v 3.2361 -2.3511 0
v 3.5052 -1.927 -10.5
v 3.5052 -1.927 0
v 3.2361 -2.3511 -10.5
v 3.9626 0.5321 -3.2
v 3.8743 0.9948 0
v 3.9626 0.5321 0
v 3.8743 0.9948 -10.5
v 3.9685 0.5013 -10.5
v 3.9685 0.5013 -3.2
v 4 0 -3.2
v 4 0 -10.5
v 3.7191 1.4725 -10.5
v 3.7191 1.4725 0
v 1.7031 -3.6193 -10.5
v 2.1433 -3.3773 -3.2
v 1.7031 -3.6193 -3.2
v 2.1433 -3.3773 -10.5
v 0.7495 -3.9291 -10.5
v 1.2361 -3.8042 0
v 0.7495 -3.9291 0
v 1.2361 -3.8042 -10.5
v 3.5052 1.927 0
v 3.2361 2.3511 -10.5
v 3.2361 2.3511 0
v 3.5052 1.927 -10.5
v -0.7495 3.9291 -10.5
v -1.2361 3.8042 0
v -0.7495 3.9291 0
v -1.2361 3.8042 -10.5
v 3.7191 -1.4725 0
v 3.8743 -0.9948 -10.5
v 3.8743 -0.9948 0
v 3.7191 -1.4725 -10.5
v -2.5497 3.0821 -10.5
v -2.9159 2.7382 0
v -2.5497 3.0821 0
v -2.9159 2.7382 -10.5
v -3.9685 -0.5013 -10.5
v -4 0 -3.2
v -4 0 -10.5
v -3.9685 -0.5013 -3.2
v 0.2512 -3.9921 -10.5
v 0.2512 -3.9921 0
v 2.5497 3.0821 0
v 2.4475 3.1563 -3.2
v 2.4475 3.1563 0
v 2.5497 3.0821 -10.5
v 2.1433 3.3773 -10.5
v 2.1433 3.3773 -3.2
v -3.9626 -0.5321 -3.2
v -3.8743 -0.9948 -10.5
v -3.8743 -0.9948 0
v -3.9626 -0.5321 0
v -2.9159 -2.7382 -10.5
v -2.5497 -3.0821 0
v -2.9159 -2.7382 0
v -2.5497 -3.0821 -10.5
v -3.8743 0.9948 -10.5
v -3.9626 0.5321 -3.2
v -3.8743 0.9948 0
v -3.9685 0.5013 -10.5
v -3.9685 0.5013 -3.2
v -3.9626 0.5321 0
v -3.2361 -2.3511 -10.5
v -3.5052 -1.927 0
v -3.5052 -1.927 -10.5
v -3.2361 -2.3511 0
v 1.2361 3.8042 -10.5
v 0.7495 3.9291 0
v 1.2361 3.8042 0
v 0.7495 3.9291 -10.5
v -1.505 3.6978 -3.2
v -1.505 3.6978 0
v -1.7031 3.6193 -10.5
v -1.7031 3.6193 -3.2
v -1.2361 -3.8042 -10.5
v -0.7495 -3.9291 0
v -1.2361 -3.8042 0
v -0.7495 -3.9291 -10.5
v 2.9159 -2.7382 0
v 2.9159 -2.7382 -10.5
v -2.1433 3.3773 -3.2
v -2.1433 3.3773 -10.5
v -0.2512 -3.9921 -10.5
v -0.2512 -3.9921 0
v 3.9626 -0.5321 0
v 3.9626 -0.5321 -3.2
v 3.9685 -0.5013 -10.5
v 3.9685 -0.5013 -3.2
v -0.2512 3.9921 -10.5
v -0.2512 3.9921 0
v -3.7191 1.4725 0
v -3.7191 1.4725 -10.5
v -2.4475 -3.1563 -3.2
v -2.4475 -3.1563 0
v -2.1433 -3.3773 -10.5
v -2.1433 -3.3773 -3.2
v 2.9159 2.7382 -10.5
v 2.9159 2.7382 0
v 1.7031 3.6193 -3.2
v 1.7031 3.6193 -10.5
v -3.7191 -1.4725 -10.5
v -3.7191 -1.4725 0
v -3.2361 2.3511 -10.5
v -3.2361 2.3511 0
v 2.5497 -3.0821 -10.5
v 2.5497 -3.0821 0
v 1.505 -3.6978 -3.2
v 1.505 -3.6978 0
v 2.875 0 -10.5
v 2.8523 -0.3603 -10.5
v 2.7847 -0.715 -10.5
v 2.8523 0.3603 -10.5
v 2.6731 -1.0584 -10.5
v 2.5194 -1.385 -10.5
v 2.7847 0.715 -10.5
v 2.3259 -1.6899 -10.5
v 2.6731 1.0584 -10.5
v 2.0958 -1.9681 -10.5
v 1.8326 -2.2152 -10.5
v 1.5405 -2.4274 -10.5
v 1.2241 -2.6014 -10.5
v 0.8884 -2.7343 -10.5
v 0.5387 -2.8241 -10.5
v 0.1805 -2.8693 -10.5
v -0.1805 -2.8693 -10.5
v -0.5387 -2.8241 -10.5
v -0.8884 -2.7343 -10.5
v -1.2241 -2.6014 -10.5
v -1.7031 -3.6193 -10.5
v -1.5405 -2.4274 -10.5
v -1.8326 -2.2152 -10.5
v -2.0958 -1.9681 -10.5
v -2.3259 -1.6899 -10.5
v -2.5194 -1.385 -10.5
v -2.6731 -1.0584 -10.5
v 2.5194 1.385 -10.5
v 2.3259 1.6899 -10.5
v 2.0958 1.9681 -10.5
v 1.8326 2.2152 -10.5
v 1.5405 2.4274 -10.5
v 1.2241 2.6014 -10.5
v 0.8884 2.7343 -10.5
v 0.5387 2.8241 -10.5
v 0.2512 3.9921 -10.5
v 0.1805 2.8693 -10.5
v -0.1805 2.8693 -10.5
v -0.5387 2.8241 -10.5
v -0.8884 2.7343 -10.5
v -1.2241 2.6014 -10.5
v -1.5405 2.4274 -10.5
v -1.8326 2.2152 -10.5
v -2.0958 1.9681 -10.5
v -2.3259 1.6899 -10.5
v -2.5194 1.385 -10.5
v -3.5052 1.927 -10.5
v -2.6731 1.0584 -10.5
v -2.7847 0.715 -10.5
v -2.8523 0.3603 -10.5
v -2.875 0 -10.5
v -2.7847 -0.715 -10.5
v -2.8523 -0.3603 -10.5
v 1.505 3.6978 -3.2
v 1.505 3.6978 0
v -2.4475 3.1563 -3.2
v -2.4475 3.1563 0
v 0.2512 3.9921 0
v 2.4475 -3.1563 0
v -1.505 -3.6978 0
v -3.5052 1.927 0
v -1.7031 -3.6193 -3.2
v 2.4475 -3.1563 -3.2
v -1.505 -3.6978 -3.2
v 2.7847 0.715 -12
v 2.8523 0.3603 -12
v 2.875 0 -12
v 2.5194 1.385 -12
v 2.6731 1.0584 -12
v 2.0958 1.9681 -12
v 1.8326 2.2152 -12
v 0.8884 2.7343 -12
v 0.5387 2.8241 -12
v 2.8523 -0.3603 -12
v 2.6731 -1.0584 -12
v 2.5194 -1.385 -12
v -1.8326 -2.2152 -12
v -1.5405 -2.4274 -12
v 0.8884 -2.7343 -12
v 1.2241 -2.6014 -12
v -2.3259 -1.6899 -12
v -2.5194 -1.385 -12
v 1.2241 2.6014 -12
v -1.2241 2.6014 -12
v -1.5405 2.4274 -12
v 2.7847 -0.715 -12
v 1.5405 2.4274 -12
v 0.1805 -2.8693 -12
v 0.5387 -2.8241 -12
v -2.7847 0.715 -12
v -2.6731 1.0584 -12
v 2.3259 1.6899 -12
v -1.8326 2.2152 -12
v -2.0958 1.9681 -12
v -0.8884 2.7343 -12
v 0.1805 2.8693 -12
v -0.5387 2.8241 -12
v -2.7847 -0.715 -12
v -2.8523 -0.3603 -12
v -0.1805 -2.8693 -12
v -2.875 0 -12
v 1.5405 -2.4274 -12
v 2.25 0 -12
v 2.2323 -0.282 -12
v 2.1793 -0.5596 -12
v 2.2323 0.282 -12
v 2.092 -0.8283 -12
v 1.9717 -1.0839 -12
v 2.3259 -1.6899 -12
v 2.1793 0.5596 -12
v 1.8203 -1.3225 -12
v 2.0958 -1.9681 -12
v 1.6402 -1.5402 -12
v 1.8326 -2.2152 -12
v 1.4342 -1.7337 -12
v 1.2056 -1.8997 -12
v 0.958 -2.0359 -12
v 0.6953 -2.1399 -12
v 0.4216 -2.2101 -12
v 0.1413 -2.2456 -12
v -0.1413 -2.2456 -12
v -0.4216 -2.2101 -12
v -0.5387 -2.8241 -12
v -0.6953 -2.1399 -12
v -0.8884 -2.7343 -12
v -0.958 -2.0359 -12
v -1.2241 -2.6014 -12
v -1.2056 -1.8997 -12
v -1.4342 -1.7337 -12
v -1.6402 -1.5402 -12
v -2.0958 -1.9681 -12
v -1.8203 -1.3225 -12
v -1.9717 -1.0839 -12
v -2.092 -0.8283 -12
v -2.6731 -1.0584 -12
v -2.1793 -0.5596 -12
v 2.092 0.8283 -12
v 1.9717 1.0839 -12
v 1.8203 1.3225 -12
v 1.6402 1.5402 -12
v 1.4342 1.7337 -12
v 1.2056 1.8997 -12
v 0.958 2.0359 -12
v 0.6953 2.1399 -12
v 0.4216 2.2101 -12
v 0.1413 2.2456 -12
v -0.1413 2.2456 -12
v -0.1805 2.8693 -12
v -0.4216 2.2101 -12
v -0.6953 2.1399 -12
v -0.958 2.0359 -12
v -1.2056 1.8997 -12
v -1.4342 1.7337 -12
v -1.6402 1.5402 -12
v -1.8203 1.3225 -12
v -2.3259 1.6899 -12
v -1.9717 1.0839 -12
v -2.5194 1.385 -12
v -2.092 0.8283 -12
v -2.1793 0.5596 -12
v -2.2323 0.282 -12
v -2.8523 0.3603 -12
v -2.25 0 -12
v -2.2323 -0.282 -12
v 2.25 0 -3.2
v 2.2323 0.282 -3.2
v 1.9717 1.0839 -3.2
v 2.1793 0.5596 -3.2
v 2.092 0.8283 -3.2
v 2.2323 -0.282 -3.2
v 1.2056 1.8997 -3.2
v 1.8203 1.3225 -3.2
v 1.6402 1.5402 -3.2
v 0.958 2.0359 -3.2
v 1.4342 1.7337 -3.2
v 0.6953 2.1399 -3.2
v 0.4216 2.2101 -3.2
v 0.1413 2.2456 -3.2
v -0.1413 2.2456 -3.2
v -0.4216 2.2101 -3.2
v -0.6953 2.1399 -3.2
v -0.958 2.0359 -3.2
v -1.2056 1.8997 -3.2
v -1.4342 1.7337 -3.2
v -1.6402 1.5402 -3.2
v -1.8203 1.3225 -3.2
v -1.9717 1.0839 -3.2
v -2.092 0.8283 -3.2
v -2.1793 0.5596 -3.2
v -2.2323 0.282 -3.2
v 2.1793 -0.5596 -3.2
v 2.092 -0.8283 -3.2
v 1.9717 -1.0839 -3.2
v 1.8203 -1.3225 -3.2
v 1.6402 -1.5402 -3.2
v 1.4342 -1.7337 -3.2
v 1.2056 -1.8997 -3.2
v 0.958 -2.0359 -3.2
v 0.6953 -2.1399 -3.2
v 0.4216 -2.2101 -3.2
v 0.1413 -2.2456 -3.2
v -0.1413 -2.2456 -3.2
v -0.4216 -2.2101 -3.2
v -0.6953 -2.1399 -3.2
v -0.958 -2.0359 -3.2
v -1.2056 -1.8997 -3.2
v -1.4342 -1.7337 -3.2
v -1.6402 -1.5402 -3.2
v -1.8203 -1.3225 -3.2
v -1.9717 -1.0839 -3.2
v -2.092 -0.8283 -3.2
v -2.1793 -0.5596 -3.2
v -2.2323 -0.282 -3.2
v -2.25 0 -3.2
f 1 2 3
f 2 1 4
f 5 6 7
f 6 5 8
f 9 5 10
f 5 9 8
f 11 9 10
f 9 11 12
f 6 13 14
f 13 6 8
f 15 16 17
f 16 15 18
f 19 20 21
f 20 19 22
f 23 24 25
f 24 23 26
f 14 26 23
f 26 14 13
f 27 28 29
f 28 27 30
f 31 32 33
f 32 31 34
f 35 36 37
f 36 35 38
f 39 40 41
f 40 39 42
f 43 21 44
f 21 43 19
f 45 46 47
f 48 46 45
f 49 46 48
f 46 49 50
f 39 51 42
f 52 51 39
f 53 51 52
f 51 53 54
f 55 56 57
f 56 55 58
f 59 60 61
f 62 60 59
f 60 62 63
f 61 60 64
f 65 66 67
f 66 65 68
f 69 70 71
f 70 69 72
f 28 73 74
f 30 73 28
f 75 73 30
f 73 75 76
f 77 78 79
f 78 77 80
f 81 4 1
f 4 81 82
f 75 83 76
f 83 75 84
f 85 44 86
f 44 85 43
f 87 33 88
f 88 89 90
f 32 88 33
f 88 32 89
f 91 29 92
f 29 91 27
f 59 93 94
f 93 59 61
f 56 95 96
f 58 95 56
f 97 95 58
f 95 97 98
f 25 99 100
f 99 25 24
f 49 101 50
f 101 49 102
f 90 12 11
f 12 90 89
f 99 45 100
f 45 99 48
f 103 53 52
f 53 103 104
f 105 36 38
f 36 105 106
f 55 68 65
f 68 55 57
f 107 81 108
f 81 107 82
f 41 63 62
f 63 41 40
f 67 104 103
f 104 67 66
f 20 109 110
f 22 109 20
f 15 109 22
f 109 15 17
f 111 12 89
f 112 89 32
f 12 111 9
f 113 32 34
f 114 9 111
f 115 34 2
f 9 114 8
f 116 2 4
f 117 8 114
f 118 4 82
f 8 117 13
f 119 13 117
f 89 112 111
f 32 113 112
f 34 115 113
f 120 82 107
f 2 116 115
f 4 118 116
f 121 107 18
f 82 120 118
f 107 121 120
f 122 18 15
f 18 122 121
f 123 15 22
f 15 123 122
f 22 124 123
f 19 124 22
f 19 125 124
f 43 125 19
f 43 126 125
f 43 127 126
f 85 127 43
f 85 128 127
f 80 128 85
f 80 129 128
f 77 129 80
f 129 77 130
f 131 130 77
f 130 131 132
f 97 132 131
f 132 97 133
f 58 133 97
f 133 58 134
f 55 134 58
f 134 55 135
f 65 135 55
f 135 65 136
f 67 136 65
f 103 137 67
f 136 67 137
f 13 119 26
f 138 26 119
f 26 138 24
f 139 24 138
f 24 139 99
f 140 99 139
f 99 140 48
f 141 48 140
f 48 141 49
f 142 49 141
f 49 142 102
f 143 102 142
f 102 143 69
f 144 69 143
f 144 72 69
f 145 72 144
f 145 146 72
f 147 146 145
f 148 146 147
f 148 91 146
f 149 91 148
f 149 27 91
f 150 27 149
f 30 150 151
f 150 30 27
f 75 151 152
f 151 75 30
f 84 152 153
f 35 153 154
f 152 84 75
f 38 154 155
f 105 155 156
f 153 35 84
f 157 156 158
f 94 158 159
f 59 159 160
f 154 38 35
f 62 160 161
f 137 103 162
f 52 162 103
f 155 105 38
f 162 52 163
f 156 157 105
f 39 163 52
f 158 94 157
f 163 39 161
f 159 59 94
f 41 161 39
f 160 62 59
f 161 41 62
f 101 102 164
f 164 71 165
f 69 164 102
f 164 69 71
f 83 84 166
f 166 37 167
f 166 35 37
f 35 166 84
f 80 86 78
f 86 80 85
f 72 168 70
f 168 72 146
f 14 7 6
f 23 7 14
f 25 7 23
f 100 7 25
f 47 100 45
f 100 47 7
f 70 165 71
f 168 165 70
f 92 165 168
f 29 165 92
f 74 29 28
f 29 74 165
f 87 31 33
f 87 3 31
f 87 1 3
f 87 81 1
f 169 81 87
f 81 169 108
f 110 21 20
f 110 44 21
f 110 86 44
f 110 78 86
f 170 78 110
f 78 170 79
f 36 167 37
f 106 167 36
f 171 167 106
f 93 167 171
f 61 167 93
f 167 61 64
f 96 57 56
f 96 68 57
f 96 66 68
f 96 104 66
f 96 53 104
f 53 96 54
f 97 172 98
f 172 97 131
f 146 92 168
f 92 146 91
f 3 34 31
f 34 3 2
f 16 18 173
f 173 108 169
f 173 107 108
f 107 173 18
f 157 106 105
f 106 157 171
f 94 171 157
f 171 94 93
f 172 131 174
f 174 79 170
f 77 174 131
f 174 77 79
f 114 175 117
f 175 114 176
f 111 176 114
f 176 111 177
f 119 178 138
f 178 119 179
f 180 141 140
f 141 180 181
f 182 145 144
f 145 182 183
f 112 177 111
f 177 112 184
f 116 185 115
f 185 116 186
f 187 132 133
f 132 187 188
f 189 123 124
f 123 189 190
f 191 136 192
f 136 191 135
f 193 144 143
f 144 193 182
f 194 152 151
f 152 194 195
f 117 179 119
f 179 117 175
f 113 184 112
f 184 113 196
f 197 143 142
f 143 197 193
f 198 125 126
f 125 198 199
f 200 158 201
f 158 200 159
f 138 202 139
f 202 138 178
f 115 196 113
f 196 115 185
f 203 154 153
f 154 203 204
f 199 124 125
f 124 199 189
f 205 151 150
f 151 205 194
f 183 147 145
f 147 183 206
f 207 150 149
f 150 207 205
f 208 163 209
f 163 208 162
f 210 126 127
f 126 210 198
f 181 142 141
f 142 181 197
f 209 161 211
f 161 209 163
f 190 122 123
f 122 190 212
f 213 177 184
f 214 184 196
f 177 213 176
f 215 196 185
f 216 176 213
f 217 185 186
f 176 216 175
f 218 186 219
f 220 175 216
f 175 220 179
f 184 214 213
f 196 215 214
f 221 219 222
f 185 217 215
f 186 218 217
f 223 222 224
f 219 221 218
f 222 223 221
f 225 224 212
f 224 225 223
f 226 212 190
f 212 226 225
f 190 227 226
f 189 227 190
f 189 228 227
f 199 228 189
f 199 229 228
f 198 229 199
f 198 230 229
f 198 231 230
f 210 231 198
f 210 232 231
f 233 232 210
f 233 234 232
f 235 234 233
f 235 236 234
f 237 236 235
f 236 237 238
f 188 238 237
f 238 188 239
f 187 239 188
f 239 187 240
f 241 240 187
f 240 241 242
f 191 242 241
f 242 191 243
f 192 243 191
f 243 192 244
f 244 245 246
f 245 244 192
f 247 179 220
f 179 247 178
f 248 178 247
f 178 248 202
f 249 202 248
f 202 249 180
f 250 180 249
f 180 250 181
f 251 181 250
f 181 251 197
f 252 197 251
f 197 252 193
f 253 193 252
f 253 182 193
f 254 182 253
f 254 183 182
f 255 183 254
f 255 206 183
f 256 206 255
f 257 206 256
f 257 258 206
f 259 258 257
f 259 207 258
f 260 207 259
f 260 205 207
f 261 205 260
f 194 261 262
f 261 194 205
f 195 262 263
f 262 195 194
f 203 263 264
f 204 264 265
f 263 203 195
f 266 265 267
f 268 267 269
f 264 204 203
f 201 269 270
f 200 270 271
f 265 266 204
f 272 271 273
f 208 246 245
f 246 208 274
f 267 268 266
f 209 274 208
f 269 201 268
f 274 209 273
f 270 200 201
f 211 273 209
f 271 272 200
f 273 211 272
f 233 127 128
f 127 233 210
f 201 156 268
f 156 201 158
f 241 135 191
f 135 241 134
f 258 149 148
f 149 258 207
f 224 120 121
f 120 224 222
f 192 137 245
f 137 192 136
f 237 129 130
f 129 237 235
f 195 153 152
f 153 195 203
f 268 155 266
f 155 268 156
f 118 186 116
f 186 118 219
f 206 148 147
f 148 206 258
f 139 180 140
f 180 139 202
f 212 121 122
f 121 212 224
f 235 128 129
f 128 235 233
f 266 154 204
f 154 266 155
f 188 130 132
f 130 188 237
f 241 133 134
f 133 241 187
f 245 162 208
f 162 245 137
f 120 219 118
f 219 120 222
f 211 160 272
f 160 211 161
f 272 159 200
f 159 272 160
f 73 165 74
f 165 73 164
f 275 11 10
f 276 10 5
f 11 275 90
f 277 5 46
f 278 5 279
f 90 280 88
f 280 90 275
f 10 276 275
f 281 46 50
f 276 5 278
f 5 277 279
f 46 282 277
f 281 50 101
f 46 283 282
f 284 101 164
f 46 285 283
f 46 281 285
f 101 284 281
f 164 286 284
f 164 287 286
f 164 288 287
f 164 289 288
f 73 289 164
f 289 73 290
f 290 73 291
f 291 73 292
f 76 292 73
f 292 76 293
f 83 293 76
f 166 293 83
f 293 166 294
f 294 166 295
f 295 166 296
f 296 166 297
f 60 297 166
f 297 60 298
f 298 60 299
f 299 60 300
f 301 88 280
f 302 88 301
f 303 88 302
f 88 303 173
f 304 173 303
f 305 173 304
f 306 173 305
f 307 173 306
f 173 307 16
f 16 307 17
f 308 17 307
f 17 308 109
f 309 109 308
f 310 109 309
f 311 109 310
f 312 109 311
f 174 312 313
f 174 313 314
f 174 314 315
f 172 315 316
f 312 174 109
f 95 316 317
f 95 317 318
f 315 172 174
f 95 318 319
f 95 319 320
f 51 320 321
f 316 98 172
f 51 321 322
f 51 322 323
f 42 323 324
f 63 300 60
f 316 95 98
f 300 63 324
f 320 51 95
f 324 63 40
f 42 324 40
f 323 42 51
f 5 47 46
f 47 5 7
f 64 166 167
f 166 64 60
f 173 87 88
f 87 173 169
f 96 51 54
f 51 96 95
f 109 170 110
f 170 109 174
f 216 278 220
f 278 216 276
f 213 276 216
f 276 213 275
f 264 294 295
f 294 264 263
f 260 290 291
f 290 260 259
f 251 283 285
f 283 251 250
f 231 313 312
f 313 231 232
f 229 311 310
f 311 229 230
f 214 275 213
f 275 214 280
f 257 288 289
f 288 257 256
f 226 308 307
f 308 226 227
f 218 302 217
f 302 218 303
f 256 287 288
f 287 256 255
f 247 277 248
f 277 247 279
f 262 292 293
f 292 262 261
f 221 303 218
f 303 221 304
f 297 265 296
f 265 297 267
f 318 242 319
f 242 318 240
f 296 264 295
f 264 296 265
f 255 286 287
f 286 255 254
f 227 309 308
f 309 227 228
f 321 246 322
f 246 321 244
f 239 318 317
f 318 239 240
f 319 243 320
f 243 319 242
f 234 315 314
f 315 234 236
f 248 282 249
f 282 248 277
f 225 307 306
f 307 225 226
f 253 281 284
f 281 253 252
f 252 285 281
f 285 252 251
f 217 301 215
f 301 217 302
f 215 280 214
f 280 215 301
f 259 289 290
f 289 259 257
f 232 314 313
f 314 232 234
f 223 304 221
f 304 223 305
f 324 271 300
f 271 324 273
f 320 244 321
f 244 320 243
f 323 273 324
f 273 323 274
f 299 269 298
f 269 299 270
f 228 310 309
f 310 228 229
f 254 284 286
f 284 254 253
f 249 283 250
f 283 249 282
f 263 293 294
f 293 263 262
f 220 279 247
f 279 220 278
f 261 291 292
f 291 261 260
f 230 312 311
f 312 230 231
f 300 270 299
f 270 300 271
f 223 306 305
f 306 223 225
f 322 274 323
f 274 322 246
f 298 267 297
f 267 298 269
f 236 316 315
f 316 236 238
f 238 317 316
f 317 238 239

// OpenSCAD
$fn = 50;

difference() {
	union() {
		translate(v = [0, 0, -10.5]) {
			cylinder(h = 10.5, r = 4.0);
		}
		#translate(v = [0, 0, -12.0]) {
			cylinder(h = 12, r = 2.875);
		}
	}
	union() {
		translate(v = [0, 0, 0]) {
			rotate(a = [0, 0, 0]) {
				difference() {
					union() {
						translate(v = [0, 0, -3.2]) {
							linear_extrude(height = 3.2) {
								polygon(points = [[4.2698, 0.0], [2.1349000000000005, 3.697755269078796], [-2.134899999999999, 3.6977552690787965], [-4.2698, 5.228996902999369e-16], [-2.134900000000002, -3.6977552690787956], [2.1348999999999974, -3.697755269078798]]);
							}
						}
					}
					union();
				}
			}
		}
		#translate(v = [0, 0, -100.0]) {
			cylinder(h = 200, r = 2.25);
		}
	}
}
